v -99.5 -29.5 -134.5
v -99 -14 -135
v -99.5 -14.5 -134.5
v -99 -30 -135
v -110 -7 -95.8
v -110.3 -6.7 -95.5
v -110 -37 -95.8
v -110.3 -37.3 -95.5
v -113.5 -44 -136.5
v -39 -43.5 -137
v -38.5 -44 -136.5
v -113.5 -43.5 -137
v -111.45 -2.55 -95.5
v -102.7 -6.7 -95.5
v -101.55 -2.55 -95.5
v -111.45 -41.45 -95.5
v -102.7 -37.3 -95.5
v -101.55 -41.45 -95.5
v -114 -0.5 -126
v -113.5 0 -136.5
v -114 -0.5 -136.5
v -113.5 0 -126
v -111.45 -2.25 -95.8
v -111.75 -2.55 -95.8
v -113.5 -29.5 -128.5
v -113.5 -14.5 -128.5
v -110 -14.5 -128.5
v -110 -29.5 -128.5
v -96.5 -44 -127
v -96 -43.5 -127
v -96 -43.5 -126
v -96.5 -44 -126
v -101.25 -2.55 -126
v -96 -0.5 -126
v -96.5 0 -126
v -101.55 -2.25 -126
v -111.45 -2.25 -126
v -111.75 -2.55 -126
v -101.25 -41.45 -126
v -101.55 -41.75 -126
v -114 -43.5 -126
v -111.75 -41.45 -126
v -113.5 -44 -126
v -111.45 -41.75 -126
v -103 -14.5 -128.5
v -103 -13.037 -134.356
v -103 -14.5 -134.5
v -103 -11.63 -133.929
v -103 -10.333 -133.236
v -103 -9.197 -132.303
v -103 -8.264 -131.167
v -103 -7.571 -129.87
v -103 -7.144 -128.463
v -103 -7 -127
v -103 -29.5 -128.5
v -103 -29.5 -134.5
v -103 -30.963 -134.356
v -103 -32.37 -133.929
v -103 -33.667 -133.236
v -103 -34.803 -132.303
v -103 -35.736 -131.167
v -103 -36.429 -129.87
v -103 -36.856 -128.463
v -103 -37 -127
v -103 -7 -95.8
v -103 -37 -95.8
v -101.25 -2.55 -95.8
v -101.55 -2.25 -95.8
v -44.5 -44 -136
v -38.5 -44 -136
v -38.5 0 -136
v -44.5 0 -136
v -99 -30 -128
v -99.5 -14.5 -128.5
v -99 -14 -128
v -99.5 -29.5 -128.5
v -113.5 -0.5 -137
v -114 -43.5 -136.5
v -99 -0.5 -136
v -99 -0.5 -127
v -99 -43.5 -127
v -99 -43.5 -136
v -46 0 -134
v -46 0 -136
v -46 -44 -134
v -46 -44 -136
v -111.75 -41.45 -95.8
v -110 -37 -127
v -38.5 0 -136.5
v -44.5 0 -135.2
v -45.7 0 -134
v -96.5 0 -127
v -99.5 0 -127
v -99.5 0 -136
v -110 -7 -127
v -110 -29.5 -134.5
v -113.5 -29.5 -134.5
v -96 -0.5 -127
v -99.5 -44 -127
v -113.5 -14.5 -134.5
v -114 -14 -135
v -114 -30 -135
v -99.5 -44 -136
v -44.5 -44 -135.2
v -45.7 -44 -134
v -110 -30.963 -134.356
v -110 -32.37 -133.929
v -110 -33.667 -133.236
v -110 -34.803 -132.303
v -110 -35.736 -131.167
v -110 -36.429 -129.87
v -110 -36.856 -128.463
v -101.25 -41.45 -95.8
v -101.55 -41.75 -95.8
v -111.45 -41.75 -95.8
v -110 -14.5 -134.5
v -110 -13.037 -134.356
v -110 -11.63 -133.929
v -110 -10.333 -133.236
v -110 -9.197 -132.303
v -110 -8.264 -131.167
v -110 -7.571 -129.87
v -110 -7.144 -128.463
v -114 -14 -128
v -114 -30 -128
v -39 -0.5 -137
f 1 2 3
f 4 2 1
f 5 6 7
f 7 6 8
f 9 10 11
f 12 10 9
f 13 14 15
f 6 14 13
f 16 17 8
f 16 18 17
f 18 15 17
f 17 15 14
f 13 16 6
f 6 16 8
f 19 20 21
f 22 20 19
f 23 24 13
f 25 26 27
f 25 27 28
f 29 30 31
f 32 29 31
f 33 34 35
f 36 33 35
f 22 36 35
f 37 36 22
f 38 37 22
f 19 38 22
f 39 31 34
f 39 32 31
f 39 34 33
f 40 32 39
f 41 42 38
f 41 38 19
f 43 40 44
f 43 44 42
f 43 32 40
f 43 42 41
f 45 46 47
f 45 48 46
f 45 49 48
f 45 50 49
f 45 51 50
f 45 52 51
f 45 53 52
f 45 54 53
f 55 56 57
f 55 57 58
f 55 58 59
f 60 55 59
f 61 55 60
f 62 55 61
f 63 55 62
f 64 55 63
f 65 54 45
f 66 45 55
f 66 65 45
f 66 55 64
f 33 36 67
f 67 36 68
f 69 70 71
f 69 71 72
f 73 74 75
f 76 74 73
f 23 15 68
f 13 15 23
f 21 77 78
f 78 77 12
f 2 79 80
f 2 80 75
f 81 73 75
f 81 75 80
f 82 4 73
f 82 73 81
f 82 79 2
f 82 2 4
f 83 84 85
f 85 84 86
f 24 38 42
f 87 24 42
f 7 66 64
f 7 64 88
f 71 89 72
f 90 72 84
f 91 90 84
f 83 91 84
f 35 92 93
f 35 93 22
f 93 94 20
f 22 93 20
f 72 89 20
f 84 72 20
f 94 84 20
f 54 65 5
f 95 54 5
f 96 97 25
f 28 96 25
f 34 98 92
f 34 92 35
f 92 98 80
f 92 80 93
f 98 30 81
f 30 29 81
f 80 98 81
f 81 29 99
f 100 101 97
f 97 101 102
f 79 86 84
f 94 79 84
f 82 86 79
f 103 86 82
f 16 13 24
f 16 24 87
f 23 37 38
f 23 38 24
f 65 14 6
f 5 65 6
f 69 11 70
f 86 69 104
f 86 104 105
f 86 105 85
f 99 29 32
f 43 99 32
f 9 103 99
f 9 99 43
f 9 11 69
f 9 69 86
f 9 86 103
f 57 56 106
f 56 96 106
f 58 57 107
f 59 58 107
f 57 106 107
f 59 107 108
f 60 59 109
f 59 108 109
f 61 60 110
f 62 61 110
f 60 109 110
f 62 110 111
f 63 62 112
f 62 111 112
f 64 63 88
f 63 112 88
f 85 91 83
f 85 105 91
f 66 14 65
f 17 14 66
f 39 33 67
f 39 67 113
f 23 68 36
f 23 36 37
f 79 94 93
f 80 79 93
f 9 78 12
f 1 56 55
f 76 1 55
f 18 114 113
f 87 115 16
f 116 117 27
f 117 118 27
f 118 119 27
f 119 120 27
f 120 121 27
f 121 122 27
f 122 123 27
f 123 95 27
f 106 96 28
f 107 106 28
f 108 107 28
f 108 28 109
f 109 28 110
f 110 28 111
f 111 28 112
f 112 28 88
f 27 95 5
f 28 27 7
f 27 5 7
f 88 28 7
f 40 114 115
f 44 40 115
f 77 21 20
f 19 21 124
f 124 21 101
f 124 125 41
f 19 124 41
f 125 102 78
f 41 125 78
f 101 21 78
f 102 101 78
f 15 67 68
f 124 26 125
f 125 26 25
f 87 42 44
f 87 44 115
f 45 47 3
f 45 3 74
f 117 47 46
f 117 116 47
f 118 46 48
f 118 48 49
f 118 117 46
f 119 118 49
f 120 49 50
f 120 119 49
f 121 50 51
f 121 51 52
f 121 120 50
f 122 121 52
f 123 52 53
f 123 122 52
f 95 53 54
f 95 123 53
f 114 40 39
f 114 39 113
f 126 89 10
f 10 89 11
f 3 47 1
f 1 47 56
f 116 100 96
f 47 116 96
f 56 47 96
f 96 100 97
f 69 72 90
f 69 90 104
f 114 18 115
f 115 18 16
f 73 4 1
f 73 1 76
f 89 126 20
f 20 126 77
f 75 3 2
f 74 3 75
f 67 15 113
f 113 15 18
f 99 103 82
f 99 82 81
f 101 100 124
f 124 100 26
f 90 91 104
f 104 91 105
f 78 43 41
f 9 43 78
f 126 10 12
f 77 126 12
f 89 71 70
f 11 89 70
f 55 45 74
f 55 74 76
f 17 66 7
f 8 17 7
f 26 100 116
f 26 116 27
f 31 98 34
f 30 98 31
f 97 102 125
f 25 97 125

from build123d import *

# Parameters (mm, degrees)
SKETCH073_W             = 75.5
SKETCH073_H             = 44
PAD038_DEPTH            = 1
SKETCH074_W             = 15
SKETCH074_H             = 44
PAD039_DEPTH            = 9
SKETCH075_W             = 18
SKETCH075_H             = 44
PAD040_DEPTH            = 1
SKETCH076_W             = 10.5
SKETCH076_H             = 39.5
PAD041_DEPTH            = 30.5
SKETCH077_W             = 7
SKETCH077_H             = 30
POCKET027_DEPTH         = 39
SKETCH078_W             = 15
SKETCH078_H             = 6
POCKET028_DEPTH         = 15
SKETCH079_W             = 1.5
SKETCH079_H             = 44
PAD042_DEPTH            = 2
CHAMFER044_SIZE         = 1.2
FILLET011_R             = 7.5
CHAMFER045_SIZE         = 0.5
CHAMFER050_SIZE         = 0.3
BODY014_PLACEMENT_ANGLE = 180


with BuildPart() as part:
    # Sketch073 → Pad038 (new body)
    with BuildSketch(Plane.XY):
        with Locations((-30.25, 0)):
            Rectangle(SKETCH073_W, SKETCH073_H)
    extrude(amount=-PAD038_DEPTH)

    # Sketch074 (on Face5 of Pad038) → Pad039 (join)
    with BuildSketch(Plane.XY):
        Rectangle(SKETCH074_W, SKETCH074_H)
    extrude(amount=PAD039_DEPTH)

    # Sketch075 (on Face5 of Pad039) → Pad040 (join)
    with BuildSketch(Plane.XY.offset(9)):
        with Locations((-1.5, 0)):
            Rectangle(SKETCH075_W, SKETCH075_H)
    extrude(amount=PAD040_DEPTH)

    # Sketch076 (on Face7 of Pad040) → Pad041 (join)
    with BuildSketch(Plane.XY.offset(10)):
        Rectangle(SKETCH076_W, SKETCH076_H)
    extrude(amount=PAD041_DEPTH)

    # Sketch077 (on Face15 of Pad041) → Pocket027 (cut)
    with BuildSketch(Plane.XY.offset(40.5)):
        Rectangle(SKETCH077_W, SKETCH077_H)
    extrude(amount=-POCKET027_DEPTH, mode=Mode.SUBTRACT)

    # Sketch078 (on Face6 of Pocket027) → Pocket028 (cut)
    with BuildSketch(Plane.YZ.offset(7.5)):
        with Locations((0, 4.5)):
            Rectangle(SKETCH078_W, SKETCH078_H)
    extrude(amount=-POCKET028_DEPTH, mode=Mode.SUBTRACT)

    # Sketch079 (on Face4 of Pocket028) → Pad042 (join)
    with BuildSketch(Plane.XY):
        with Locations((-61.25, 0)):
            Rectangle(SKETCH079_W, SKETCH079_H)
    extrude(amount=PAD042_DEPTH)

    # Chamfer044
    chamfer044_edges = [part.edges().sort_by_distance(p)[0] for p in [
        (-62, 0, 2),
    ]]
    chamfer(chamfer044_edges, length=CHAMFER044_SIZE)

    # Fillet011
    fillet011_edges = [part.edges().sort_by_distance(p)[0] for p in [
        (0, 15, 1.5),
        (0, -15, 1.5),
    ]]
    fillet(fillet011_edges, radius=FILLET011_R)

    # Chamfer045
    chamfer045_edges = [part.edges().sort_by_distance(p)[0] for p in [
        (-7.5, 7.5, 4.5),
        (-7.5, 0, 7.5),
        (-7.5, -7.5, 4.5),
        (-7.5, 0, 1.5),
        (7.5, 7.5, 4.5),
        (7.5, 0, 1.5),
        (7.5, -7.5, 4.5),
        (7.5, 0, 7.5),
        (7.5, -22, 4.5),
        (7.5, 22, 4.5),
        (7.5, 0, -1),
        (-7.5, -22, 4.5),
        (-30.25, -22, -1),
        (-68, 0, -1),
        (-30.25, 22, -1),
        (-7.5, 22, 4.5),
        (-10.5, -22, 9.5),
        (-10.5, 22, 9.5),
    ]]
    chamfer(chamfer045_edges, length=CHAMFER045_SIZE)

    # Chamfer050
    chamfer050_edges = [part.edges().sort_by_distance(p)[0] for p in [
        (5.25, 19.75, 25.25),
        (-5.25, 19.75, 25.25),
        (-5.25, -19.75, 25.25),
        (5.25, -19.75, 25.25),
        (0, 19.75, 40.5),
        (-5.25, 0, 40.5),
        (5.25, 0, 40.5),
        (0, -19.75, 40.5),
        (-3.5, 0, 40.5),
        (0, -15, 40.5),
        (3.5, 0, 40.5),
        (0, 15, 40.5),
    ]]
    chamfer(chamfer050_edges, length=CHAMFER050_SIZE)


with BuildPart() as part_1:
    # Body014 placement: moved
    add(part.part.moved(Location((-106.5, -22, -136))).rotate(Axis((-106.5, -22, -136), (0, 0, 1)), BODY014_PLACEMENT_ANGLE))


solid = part_1.part
